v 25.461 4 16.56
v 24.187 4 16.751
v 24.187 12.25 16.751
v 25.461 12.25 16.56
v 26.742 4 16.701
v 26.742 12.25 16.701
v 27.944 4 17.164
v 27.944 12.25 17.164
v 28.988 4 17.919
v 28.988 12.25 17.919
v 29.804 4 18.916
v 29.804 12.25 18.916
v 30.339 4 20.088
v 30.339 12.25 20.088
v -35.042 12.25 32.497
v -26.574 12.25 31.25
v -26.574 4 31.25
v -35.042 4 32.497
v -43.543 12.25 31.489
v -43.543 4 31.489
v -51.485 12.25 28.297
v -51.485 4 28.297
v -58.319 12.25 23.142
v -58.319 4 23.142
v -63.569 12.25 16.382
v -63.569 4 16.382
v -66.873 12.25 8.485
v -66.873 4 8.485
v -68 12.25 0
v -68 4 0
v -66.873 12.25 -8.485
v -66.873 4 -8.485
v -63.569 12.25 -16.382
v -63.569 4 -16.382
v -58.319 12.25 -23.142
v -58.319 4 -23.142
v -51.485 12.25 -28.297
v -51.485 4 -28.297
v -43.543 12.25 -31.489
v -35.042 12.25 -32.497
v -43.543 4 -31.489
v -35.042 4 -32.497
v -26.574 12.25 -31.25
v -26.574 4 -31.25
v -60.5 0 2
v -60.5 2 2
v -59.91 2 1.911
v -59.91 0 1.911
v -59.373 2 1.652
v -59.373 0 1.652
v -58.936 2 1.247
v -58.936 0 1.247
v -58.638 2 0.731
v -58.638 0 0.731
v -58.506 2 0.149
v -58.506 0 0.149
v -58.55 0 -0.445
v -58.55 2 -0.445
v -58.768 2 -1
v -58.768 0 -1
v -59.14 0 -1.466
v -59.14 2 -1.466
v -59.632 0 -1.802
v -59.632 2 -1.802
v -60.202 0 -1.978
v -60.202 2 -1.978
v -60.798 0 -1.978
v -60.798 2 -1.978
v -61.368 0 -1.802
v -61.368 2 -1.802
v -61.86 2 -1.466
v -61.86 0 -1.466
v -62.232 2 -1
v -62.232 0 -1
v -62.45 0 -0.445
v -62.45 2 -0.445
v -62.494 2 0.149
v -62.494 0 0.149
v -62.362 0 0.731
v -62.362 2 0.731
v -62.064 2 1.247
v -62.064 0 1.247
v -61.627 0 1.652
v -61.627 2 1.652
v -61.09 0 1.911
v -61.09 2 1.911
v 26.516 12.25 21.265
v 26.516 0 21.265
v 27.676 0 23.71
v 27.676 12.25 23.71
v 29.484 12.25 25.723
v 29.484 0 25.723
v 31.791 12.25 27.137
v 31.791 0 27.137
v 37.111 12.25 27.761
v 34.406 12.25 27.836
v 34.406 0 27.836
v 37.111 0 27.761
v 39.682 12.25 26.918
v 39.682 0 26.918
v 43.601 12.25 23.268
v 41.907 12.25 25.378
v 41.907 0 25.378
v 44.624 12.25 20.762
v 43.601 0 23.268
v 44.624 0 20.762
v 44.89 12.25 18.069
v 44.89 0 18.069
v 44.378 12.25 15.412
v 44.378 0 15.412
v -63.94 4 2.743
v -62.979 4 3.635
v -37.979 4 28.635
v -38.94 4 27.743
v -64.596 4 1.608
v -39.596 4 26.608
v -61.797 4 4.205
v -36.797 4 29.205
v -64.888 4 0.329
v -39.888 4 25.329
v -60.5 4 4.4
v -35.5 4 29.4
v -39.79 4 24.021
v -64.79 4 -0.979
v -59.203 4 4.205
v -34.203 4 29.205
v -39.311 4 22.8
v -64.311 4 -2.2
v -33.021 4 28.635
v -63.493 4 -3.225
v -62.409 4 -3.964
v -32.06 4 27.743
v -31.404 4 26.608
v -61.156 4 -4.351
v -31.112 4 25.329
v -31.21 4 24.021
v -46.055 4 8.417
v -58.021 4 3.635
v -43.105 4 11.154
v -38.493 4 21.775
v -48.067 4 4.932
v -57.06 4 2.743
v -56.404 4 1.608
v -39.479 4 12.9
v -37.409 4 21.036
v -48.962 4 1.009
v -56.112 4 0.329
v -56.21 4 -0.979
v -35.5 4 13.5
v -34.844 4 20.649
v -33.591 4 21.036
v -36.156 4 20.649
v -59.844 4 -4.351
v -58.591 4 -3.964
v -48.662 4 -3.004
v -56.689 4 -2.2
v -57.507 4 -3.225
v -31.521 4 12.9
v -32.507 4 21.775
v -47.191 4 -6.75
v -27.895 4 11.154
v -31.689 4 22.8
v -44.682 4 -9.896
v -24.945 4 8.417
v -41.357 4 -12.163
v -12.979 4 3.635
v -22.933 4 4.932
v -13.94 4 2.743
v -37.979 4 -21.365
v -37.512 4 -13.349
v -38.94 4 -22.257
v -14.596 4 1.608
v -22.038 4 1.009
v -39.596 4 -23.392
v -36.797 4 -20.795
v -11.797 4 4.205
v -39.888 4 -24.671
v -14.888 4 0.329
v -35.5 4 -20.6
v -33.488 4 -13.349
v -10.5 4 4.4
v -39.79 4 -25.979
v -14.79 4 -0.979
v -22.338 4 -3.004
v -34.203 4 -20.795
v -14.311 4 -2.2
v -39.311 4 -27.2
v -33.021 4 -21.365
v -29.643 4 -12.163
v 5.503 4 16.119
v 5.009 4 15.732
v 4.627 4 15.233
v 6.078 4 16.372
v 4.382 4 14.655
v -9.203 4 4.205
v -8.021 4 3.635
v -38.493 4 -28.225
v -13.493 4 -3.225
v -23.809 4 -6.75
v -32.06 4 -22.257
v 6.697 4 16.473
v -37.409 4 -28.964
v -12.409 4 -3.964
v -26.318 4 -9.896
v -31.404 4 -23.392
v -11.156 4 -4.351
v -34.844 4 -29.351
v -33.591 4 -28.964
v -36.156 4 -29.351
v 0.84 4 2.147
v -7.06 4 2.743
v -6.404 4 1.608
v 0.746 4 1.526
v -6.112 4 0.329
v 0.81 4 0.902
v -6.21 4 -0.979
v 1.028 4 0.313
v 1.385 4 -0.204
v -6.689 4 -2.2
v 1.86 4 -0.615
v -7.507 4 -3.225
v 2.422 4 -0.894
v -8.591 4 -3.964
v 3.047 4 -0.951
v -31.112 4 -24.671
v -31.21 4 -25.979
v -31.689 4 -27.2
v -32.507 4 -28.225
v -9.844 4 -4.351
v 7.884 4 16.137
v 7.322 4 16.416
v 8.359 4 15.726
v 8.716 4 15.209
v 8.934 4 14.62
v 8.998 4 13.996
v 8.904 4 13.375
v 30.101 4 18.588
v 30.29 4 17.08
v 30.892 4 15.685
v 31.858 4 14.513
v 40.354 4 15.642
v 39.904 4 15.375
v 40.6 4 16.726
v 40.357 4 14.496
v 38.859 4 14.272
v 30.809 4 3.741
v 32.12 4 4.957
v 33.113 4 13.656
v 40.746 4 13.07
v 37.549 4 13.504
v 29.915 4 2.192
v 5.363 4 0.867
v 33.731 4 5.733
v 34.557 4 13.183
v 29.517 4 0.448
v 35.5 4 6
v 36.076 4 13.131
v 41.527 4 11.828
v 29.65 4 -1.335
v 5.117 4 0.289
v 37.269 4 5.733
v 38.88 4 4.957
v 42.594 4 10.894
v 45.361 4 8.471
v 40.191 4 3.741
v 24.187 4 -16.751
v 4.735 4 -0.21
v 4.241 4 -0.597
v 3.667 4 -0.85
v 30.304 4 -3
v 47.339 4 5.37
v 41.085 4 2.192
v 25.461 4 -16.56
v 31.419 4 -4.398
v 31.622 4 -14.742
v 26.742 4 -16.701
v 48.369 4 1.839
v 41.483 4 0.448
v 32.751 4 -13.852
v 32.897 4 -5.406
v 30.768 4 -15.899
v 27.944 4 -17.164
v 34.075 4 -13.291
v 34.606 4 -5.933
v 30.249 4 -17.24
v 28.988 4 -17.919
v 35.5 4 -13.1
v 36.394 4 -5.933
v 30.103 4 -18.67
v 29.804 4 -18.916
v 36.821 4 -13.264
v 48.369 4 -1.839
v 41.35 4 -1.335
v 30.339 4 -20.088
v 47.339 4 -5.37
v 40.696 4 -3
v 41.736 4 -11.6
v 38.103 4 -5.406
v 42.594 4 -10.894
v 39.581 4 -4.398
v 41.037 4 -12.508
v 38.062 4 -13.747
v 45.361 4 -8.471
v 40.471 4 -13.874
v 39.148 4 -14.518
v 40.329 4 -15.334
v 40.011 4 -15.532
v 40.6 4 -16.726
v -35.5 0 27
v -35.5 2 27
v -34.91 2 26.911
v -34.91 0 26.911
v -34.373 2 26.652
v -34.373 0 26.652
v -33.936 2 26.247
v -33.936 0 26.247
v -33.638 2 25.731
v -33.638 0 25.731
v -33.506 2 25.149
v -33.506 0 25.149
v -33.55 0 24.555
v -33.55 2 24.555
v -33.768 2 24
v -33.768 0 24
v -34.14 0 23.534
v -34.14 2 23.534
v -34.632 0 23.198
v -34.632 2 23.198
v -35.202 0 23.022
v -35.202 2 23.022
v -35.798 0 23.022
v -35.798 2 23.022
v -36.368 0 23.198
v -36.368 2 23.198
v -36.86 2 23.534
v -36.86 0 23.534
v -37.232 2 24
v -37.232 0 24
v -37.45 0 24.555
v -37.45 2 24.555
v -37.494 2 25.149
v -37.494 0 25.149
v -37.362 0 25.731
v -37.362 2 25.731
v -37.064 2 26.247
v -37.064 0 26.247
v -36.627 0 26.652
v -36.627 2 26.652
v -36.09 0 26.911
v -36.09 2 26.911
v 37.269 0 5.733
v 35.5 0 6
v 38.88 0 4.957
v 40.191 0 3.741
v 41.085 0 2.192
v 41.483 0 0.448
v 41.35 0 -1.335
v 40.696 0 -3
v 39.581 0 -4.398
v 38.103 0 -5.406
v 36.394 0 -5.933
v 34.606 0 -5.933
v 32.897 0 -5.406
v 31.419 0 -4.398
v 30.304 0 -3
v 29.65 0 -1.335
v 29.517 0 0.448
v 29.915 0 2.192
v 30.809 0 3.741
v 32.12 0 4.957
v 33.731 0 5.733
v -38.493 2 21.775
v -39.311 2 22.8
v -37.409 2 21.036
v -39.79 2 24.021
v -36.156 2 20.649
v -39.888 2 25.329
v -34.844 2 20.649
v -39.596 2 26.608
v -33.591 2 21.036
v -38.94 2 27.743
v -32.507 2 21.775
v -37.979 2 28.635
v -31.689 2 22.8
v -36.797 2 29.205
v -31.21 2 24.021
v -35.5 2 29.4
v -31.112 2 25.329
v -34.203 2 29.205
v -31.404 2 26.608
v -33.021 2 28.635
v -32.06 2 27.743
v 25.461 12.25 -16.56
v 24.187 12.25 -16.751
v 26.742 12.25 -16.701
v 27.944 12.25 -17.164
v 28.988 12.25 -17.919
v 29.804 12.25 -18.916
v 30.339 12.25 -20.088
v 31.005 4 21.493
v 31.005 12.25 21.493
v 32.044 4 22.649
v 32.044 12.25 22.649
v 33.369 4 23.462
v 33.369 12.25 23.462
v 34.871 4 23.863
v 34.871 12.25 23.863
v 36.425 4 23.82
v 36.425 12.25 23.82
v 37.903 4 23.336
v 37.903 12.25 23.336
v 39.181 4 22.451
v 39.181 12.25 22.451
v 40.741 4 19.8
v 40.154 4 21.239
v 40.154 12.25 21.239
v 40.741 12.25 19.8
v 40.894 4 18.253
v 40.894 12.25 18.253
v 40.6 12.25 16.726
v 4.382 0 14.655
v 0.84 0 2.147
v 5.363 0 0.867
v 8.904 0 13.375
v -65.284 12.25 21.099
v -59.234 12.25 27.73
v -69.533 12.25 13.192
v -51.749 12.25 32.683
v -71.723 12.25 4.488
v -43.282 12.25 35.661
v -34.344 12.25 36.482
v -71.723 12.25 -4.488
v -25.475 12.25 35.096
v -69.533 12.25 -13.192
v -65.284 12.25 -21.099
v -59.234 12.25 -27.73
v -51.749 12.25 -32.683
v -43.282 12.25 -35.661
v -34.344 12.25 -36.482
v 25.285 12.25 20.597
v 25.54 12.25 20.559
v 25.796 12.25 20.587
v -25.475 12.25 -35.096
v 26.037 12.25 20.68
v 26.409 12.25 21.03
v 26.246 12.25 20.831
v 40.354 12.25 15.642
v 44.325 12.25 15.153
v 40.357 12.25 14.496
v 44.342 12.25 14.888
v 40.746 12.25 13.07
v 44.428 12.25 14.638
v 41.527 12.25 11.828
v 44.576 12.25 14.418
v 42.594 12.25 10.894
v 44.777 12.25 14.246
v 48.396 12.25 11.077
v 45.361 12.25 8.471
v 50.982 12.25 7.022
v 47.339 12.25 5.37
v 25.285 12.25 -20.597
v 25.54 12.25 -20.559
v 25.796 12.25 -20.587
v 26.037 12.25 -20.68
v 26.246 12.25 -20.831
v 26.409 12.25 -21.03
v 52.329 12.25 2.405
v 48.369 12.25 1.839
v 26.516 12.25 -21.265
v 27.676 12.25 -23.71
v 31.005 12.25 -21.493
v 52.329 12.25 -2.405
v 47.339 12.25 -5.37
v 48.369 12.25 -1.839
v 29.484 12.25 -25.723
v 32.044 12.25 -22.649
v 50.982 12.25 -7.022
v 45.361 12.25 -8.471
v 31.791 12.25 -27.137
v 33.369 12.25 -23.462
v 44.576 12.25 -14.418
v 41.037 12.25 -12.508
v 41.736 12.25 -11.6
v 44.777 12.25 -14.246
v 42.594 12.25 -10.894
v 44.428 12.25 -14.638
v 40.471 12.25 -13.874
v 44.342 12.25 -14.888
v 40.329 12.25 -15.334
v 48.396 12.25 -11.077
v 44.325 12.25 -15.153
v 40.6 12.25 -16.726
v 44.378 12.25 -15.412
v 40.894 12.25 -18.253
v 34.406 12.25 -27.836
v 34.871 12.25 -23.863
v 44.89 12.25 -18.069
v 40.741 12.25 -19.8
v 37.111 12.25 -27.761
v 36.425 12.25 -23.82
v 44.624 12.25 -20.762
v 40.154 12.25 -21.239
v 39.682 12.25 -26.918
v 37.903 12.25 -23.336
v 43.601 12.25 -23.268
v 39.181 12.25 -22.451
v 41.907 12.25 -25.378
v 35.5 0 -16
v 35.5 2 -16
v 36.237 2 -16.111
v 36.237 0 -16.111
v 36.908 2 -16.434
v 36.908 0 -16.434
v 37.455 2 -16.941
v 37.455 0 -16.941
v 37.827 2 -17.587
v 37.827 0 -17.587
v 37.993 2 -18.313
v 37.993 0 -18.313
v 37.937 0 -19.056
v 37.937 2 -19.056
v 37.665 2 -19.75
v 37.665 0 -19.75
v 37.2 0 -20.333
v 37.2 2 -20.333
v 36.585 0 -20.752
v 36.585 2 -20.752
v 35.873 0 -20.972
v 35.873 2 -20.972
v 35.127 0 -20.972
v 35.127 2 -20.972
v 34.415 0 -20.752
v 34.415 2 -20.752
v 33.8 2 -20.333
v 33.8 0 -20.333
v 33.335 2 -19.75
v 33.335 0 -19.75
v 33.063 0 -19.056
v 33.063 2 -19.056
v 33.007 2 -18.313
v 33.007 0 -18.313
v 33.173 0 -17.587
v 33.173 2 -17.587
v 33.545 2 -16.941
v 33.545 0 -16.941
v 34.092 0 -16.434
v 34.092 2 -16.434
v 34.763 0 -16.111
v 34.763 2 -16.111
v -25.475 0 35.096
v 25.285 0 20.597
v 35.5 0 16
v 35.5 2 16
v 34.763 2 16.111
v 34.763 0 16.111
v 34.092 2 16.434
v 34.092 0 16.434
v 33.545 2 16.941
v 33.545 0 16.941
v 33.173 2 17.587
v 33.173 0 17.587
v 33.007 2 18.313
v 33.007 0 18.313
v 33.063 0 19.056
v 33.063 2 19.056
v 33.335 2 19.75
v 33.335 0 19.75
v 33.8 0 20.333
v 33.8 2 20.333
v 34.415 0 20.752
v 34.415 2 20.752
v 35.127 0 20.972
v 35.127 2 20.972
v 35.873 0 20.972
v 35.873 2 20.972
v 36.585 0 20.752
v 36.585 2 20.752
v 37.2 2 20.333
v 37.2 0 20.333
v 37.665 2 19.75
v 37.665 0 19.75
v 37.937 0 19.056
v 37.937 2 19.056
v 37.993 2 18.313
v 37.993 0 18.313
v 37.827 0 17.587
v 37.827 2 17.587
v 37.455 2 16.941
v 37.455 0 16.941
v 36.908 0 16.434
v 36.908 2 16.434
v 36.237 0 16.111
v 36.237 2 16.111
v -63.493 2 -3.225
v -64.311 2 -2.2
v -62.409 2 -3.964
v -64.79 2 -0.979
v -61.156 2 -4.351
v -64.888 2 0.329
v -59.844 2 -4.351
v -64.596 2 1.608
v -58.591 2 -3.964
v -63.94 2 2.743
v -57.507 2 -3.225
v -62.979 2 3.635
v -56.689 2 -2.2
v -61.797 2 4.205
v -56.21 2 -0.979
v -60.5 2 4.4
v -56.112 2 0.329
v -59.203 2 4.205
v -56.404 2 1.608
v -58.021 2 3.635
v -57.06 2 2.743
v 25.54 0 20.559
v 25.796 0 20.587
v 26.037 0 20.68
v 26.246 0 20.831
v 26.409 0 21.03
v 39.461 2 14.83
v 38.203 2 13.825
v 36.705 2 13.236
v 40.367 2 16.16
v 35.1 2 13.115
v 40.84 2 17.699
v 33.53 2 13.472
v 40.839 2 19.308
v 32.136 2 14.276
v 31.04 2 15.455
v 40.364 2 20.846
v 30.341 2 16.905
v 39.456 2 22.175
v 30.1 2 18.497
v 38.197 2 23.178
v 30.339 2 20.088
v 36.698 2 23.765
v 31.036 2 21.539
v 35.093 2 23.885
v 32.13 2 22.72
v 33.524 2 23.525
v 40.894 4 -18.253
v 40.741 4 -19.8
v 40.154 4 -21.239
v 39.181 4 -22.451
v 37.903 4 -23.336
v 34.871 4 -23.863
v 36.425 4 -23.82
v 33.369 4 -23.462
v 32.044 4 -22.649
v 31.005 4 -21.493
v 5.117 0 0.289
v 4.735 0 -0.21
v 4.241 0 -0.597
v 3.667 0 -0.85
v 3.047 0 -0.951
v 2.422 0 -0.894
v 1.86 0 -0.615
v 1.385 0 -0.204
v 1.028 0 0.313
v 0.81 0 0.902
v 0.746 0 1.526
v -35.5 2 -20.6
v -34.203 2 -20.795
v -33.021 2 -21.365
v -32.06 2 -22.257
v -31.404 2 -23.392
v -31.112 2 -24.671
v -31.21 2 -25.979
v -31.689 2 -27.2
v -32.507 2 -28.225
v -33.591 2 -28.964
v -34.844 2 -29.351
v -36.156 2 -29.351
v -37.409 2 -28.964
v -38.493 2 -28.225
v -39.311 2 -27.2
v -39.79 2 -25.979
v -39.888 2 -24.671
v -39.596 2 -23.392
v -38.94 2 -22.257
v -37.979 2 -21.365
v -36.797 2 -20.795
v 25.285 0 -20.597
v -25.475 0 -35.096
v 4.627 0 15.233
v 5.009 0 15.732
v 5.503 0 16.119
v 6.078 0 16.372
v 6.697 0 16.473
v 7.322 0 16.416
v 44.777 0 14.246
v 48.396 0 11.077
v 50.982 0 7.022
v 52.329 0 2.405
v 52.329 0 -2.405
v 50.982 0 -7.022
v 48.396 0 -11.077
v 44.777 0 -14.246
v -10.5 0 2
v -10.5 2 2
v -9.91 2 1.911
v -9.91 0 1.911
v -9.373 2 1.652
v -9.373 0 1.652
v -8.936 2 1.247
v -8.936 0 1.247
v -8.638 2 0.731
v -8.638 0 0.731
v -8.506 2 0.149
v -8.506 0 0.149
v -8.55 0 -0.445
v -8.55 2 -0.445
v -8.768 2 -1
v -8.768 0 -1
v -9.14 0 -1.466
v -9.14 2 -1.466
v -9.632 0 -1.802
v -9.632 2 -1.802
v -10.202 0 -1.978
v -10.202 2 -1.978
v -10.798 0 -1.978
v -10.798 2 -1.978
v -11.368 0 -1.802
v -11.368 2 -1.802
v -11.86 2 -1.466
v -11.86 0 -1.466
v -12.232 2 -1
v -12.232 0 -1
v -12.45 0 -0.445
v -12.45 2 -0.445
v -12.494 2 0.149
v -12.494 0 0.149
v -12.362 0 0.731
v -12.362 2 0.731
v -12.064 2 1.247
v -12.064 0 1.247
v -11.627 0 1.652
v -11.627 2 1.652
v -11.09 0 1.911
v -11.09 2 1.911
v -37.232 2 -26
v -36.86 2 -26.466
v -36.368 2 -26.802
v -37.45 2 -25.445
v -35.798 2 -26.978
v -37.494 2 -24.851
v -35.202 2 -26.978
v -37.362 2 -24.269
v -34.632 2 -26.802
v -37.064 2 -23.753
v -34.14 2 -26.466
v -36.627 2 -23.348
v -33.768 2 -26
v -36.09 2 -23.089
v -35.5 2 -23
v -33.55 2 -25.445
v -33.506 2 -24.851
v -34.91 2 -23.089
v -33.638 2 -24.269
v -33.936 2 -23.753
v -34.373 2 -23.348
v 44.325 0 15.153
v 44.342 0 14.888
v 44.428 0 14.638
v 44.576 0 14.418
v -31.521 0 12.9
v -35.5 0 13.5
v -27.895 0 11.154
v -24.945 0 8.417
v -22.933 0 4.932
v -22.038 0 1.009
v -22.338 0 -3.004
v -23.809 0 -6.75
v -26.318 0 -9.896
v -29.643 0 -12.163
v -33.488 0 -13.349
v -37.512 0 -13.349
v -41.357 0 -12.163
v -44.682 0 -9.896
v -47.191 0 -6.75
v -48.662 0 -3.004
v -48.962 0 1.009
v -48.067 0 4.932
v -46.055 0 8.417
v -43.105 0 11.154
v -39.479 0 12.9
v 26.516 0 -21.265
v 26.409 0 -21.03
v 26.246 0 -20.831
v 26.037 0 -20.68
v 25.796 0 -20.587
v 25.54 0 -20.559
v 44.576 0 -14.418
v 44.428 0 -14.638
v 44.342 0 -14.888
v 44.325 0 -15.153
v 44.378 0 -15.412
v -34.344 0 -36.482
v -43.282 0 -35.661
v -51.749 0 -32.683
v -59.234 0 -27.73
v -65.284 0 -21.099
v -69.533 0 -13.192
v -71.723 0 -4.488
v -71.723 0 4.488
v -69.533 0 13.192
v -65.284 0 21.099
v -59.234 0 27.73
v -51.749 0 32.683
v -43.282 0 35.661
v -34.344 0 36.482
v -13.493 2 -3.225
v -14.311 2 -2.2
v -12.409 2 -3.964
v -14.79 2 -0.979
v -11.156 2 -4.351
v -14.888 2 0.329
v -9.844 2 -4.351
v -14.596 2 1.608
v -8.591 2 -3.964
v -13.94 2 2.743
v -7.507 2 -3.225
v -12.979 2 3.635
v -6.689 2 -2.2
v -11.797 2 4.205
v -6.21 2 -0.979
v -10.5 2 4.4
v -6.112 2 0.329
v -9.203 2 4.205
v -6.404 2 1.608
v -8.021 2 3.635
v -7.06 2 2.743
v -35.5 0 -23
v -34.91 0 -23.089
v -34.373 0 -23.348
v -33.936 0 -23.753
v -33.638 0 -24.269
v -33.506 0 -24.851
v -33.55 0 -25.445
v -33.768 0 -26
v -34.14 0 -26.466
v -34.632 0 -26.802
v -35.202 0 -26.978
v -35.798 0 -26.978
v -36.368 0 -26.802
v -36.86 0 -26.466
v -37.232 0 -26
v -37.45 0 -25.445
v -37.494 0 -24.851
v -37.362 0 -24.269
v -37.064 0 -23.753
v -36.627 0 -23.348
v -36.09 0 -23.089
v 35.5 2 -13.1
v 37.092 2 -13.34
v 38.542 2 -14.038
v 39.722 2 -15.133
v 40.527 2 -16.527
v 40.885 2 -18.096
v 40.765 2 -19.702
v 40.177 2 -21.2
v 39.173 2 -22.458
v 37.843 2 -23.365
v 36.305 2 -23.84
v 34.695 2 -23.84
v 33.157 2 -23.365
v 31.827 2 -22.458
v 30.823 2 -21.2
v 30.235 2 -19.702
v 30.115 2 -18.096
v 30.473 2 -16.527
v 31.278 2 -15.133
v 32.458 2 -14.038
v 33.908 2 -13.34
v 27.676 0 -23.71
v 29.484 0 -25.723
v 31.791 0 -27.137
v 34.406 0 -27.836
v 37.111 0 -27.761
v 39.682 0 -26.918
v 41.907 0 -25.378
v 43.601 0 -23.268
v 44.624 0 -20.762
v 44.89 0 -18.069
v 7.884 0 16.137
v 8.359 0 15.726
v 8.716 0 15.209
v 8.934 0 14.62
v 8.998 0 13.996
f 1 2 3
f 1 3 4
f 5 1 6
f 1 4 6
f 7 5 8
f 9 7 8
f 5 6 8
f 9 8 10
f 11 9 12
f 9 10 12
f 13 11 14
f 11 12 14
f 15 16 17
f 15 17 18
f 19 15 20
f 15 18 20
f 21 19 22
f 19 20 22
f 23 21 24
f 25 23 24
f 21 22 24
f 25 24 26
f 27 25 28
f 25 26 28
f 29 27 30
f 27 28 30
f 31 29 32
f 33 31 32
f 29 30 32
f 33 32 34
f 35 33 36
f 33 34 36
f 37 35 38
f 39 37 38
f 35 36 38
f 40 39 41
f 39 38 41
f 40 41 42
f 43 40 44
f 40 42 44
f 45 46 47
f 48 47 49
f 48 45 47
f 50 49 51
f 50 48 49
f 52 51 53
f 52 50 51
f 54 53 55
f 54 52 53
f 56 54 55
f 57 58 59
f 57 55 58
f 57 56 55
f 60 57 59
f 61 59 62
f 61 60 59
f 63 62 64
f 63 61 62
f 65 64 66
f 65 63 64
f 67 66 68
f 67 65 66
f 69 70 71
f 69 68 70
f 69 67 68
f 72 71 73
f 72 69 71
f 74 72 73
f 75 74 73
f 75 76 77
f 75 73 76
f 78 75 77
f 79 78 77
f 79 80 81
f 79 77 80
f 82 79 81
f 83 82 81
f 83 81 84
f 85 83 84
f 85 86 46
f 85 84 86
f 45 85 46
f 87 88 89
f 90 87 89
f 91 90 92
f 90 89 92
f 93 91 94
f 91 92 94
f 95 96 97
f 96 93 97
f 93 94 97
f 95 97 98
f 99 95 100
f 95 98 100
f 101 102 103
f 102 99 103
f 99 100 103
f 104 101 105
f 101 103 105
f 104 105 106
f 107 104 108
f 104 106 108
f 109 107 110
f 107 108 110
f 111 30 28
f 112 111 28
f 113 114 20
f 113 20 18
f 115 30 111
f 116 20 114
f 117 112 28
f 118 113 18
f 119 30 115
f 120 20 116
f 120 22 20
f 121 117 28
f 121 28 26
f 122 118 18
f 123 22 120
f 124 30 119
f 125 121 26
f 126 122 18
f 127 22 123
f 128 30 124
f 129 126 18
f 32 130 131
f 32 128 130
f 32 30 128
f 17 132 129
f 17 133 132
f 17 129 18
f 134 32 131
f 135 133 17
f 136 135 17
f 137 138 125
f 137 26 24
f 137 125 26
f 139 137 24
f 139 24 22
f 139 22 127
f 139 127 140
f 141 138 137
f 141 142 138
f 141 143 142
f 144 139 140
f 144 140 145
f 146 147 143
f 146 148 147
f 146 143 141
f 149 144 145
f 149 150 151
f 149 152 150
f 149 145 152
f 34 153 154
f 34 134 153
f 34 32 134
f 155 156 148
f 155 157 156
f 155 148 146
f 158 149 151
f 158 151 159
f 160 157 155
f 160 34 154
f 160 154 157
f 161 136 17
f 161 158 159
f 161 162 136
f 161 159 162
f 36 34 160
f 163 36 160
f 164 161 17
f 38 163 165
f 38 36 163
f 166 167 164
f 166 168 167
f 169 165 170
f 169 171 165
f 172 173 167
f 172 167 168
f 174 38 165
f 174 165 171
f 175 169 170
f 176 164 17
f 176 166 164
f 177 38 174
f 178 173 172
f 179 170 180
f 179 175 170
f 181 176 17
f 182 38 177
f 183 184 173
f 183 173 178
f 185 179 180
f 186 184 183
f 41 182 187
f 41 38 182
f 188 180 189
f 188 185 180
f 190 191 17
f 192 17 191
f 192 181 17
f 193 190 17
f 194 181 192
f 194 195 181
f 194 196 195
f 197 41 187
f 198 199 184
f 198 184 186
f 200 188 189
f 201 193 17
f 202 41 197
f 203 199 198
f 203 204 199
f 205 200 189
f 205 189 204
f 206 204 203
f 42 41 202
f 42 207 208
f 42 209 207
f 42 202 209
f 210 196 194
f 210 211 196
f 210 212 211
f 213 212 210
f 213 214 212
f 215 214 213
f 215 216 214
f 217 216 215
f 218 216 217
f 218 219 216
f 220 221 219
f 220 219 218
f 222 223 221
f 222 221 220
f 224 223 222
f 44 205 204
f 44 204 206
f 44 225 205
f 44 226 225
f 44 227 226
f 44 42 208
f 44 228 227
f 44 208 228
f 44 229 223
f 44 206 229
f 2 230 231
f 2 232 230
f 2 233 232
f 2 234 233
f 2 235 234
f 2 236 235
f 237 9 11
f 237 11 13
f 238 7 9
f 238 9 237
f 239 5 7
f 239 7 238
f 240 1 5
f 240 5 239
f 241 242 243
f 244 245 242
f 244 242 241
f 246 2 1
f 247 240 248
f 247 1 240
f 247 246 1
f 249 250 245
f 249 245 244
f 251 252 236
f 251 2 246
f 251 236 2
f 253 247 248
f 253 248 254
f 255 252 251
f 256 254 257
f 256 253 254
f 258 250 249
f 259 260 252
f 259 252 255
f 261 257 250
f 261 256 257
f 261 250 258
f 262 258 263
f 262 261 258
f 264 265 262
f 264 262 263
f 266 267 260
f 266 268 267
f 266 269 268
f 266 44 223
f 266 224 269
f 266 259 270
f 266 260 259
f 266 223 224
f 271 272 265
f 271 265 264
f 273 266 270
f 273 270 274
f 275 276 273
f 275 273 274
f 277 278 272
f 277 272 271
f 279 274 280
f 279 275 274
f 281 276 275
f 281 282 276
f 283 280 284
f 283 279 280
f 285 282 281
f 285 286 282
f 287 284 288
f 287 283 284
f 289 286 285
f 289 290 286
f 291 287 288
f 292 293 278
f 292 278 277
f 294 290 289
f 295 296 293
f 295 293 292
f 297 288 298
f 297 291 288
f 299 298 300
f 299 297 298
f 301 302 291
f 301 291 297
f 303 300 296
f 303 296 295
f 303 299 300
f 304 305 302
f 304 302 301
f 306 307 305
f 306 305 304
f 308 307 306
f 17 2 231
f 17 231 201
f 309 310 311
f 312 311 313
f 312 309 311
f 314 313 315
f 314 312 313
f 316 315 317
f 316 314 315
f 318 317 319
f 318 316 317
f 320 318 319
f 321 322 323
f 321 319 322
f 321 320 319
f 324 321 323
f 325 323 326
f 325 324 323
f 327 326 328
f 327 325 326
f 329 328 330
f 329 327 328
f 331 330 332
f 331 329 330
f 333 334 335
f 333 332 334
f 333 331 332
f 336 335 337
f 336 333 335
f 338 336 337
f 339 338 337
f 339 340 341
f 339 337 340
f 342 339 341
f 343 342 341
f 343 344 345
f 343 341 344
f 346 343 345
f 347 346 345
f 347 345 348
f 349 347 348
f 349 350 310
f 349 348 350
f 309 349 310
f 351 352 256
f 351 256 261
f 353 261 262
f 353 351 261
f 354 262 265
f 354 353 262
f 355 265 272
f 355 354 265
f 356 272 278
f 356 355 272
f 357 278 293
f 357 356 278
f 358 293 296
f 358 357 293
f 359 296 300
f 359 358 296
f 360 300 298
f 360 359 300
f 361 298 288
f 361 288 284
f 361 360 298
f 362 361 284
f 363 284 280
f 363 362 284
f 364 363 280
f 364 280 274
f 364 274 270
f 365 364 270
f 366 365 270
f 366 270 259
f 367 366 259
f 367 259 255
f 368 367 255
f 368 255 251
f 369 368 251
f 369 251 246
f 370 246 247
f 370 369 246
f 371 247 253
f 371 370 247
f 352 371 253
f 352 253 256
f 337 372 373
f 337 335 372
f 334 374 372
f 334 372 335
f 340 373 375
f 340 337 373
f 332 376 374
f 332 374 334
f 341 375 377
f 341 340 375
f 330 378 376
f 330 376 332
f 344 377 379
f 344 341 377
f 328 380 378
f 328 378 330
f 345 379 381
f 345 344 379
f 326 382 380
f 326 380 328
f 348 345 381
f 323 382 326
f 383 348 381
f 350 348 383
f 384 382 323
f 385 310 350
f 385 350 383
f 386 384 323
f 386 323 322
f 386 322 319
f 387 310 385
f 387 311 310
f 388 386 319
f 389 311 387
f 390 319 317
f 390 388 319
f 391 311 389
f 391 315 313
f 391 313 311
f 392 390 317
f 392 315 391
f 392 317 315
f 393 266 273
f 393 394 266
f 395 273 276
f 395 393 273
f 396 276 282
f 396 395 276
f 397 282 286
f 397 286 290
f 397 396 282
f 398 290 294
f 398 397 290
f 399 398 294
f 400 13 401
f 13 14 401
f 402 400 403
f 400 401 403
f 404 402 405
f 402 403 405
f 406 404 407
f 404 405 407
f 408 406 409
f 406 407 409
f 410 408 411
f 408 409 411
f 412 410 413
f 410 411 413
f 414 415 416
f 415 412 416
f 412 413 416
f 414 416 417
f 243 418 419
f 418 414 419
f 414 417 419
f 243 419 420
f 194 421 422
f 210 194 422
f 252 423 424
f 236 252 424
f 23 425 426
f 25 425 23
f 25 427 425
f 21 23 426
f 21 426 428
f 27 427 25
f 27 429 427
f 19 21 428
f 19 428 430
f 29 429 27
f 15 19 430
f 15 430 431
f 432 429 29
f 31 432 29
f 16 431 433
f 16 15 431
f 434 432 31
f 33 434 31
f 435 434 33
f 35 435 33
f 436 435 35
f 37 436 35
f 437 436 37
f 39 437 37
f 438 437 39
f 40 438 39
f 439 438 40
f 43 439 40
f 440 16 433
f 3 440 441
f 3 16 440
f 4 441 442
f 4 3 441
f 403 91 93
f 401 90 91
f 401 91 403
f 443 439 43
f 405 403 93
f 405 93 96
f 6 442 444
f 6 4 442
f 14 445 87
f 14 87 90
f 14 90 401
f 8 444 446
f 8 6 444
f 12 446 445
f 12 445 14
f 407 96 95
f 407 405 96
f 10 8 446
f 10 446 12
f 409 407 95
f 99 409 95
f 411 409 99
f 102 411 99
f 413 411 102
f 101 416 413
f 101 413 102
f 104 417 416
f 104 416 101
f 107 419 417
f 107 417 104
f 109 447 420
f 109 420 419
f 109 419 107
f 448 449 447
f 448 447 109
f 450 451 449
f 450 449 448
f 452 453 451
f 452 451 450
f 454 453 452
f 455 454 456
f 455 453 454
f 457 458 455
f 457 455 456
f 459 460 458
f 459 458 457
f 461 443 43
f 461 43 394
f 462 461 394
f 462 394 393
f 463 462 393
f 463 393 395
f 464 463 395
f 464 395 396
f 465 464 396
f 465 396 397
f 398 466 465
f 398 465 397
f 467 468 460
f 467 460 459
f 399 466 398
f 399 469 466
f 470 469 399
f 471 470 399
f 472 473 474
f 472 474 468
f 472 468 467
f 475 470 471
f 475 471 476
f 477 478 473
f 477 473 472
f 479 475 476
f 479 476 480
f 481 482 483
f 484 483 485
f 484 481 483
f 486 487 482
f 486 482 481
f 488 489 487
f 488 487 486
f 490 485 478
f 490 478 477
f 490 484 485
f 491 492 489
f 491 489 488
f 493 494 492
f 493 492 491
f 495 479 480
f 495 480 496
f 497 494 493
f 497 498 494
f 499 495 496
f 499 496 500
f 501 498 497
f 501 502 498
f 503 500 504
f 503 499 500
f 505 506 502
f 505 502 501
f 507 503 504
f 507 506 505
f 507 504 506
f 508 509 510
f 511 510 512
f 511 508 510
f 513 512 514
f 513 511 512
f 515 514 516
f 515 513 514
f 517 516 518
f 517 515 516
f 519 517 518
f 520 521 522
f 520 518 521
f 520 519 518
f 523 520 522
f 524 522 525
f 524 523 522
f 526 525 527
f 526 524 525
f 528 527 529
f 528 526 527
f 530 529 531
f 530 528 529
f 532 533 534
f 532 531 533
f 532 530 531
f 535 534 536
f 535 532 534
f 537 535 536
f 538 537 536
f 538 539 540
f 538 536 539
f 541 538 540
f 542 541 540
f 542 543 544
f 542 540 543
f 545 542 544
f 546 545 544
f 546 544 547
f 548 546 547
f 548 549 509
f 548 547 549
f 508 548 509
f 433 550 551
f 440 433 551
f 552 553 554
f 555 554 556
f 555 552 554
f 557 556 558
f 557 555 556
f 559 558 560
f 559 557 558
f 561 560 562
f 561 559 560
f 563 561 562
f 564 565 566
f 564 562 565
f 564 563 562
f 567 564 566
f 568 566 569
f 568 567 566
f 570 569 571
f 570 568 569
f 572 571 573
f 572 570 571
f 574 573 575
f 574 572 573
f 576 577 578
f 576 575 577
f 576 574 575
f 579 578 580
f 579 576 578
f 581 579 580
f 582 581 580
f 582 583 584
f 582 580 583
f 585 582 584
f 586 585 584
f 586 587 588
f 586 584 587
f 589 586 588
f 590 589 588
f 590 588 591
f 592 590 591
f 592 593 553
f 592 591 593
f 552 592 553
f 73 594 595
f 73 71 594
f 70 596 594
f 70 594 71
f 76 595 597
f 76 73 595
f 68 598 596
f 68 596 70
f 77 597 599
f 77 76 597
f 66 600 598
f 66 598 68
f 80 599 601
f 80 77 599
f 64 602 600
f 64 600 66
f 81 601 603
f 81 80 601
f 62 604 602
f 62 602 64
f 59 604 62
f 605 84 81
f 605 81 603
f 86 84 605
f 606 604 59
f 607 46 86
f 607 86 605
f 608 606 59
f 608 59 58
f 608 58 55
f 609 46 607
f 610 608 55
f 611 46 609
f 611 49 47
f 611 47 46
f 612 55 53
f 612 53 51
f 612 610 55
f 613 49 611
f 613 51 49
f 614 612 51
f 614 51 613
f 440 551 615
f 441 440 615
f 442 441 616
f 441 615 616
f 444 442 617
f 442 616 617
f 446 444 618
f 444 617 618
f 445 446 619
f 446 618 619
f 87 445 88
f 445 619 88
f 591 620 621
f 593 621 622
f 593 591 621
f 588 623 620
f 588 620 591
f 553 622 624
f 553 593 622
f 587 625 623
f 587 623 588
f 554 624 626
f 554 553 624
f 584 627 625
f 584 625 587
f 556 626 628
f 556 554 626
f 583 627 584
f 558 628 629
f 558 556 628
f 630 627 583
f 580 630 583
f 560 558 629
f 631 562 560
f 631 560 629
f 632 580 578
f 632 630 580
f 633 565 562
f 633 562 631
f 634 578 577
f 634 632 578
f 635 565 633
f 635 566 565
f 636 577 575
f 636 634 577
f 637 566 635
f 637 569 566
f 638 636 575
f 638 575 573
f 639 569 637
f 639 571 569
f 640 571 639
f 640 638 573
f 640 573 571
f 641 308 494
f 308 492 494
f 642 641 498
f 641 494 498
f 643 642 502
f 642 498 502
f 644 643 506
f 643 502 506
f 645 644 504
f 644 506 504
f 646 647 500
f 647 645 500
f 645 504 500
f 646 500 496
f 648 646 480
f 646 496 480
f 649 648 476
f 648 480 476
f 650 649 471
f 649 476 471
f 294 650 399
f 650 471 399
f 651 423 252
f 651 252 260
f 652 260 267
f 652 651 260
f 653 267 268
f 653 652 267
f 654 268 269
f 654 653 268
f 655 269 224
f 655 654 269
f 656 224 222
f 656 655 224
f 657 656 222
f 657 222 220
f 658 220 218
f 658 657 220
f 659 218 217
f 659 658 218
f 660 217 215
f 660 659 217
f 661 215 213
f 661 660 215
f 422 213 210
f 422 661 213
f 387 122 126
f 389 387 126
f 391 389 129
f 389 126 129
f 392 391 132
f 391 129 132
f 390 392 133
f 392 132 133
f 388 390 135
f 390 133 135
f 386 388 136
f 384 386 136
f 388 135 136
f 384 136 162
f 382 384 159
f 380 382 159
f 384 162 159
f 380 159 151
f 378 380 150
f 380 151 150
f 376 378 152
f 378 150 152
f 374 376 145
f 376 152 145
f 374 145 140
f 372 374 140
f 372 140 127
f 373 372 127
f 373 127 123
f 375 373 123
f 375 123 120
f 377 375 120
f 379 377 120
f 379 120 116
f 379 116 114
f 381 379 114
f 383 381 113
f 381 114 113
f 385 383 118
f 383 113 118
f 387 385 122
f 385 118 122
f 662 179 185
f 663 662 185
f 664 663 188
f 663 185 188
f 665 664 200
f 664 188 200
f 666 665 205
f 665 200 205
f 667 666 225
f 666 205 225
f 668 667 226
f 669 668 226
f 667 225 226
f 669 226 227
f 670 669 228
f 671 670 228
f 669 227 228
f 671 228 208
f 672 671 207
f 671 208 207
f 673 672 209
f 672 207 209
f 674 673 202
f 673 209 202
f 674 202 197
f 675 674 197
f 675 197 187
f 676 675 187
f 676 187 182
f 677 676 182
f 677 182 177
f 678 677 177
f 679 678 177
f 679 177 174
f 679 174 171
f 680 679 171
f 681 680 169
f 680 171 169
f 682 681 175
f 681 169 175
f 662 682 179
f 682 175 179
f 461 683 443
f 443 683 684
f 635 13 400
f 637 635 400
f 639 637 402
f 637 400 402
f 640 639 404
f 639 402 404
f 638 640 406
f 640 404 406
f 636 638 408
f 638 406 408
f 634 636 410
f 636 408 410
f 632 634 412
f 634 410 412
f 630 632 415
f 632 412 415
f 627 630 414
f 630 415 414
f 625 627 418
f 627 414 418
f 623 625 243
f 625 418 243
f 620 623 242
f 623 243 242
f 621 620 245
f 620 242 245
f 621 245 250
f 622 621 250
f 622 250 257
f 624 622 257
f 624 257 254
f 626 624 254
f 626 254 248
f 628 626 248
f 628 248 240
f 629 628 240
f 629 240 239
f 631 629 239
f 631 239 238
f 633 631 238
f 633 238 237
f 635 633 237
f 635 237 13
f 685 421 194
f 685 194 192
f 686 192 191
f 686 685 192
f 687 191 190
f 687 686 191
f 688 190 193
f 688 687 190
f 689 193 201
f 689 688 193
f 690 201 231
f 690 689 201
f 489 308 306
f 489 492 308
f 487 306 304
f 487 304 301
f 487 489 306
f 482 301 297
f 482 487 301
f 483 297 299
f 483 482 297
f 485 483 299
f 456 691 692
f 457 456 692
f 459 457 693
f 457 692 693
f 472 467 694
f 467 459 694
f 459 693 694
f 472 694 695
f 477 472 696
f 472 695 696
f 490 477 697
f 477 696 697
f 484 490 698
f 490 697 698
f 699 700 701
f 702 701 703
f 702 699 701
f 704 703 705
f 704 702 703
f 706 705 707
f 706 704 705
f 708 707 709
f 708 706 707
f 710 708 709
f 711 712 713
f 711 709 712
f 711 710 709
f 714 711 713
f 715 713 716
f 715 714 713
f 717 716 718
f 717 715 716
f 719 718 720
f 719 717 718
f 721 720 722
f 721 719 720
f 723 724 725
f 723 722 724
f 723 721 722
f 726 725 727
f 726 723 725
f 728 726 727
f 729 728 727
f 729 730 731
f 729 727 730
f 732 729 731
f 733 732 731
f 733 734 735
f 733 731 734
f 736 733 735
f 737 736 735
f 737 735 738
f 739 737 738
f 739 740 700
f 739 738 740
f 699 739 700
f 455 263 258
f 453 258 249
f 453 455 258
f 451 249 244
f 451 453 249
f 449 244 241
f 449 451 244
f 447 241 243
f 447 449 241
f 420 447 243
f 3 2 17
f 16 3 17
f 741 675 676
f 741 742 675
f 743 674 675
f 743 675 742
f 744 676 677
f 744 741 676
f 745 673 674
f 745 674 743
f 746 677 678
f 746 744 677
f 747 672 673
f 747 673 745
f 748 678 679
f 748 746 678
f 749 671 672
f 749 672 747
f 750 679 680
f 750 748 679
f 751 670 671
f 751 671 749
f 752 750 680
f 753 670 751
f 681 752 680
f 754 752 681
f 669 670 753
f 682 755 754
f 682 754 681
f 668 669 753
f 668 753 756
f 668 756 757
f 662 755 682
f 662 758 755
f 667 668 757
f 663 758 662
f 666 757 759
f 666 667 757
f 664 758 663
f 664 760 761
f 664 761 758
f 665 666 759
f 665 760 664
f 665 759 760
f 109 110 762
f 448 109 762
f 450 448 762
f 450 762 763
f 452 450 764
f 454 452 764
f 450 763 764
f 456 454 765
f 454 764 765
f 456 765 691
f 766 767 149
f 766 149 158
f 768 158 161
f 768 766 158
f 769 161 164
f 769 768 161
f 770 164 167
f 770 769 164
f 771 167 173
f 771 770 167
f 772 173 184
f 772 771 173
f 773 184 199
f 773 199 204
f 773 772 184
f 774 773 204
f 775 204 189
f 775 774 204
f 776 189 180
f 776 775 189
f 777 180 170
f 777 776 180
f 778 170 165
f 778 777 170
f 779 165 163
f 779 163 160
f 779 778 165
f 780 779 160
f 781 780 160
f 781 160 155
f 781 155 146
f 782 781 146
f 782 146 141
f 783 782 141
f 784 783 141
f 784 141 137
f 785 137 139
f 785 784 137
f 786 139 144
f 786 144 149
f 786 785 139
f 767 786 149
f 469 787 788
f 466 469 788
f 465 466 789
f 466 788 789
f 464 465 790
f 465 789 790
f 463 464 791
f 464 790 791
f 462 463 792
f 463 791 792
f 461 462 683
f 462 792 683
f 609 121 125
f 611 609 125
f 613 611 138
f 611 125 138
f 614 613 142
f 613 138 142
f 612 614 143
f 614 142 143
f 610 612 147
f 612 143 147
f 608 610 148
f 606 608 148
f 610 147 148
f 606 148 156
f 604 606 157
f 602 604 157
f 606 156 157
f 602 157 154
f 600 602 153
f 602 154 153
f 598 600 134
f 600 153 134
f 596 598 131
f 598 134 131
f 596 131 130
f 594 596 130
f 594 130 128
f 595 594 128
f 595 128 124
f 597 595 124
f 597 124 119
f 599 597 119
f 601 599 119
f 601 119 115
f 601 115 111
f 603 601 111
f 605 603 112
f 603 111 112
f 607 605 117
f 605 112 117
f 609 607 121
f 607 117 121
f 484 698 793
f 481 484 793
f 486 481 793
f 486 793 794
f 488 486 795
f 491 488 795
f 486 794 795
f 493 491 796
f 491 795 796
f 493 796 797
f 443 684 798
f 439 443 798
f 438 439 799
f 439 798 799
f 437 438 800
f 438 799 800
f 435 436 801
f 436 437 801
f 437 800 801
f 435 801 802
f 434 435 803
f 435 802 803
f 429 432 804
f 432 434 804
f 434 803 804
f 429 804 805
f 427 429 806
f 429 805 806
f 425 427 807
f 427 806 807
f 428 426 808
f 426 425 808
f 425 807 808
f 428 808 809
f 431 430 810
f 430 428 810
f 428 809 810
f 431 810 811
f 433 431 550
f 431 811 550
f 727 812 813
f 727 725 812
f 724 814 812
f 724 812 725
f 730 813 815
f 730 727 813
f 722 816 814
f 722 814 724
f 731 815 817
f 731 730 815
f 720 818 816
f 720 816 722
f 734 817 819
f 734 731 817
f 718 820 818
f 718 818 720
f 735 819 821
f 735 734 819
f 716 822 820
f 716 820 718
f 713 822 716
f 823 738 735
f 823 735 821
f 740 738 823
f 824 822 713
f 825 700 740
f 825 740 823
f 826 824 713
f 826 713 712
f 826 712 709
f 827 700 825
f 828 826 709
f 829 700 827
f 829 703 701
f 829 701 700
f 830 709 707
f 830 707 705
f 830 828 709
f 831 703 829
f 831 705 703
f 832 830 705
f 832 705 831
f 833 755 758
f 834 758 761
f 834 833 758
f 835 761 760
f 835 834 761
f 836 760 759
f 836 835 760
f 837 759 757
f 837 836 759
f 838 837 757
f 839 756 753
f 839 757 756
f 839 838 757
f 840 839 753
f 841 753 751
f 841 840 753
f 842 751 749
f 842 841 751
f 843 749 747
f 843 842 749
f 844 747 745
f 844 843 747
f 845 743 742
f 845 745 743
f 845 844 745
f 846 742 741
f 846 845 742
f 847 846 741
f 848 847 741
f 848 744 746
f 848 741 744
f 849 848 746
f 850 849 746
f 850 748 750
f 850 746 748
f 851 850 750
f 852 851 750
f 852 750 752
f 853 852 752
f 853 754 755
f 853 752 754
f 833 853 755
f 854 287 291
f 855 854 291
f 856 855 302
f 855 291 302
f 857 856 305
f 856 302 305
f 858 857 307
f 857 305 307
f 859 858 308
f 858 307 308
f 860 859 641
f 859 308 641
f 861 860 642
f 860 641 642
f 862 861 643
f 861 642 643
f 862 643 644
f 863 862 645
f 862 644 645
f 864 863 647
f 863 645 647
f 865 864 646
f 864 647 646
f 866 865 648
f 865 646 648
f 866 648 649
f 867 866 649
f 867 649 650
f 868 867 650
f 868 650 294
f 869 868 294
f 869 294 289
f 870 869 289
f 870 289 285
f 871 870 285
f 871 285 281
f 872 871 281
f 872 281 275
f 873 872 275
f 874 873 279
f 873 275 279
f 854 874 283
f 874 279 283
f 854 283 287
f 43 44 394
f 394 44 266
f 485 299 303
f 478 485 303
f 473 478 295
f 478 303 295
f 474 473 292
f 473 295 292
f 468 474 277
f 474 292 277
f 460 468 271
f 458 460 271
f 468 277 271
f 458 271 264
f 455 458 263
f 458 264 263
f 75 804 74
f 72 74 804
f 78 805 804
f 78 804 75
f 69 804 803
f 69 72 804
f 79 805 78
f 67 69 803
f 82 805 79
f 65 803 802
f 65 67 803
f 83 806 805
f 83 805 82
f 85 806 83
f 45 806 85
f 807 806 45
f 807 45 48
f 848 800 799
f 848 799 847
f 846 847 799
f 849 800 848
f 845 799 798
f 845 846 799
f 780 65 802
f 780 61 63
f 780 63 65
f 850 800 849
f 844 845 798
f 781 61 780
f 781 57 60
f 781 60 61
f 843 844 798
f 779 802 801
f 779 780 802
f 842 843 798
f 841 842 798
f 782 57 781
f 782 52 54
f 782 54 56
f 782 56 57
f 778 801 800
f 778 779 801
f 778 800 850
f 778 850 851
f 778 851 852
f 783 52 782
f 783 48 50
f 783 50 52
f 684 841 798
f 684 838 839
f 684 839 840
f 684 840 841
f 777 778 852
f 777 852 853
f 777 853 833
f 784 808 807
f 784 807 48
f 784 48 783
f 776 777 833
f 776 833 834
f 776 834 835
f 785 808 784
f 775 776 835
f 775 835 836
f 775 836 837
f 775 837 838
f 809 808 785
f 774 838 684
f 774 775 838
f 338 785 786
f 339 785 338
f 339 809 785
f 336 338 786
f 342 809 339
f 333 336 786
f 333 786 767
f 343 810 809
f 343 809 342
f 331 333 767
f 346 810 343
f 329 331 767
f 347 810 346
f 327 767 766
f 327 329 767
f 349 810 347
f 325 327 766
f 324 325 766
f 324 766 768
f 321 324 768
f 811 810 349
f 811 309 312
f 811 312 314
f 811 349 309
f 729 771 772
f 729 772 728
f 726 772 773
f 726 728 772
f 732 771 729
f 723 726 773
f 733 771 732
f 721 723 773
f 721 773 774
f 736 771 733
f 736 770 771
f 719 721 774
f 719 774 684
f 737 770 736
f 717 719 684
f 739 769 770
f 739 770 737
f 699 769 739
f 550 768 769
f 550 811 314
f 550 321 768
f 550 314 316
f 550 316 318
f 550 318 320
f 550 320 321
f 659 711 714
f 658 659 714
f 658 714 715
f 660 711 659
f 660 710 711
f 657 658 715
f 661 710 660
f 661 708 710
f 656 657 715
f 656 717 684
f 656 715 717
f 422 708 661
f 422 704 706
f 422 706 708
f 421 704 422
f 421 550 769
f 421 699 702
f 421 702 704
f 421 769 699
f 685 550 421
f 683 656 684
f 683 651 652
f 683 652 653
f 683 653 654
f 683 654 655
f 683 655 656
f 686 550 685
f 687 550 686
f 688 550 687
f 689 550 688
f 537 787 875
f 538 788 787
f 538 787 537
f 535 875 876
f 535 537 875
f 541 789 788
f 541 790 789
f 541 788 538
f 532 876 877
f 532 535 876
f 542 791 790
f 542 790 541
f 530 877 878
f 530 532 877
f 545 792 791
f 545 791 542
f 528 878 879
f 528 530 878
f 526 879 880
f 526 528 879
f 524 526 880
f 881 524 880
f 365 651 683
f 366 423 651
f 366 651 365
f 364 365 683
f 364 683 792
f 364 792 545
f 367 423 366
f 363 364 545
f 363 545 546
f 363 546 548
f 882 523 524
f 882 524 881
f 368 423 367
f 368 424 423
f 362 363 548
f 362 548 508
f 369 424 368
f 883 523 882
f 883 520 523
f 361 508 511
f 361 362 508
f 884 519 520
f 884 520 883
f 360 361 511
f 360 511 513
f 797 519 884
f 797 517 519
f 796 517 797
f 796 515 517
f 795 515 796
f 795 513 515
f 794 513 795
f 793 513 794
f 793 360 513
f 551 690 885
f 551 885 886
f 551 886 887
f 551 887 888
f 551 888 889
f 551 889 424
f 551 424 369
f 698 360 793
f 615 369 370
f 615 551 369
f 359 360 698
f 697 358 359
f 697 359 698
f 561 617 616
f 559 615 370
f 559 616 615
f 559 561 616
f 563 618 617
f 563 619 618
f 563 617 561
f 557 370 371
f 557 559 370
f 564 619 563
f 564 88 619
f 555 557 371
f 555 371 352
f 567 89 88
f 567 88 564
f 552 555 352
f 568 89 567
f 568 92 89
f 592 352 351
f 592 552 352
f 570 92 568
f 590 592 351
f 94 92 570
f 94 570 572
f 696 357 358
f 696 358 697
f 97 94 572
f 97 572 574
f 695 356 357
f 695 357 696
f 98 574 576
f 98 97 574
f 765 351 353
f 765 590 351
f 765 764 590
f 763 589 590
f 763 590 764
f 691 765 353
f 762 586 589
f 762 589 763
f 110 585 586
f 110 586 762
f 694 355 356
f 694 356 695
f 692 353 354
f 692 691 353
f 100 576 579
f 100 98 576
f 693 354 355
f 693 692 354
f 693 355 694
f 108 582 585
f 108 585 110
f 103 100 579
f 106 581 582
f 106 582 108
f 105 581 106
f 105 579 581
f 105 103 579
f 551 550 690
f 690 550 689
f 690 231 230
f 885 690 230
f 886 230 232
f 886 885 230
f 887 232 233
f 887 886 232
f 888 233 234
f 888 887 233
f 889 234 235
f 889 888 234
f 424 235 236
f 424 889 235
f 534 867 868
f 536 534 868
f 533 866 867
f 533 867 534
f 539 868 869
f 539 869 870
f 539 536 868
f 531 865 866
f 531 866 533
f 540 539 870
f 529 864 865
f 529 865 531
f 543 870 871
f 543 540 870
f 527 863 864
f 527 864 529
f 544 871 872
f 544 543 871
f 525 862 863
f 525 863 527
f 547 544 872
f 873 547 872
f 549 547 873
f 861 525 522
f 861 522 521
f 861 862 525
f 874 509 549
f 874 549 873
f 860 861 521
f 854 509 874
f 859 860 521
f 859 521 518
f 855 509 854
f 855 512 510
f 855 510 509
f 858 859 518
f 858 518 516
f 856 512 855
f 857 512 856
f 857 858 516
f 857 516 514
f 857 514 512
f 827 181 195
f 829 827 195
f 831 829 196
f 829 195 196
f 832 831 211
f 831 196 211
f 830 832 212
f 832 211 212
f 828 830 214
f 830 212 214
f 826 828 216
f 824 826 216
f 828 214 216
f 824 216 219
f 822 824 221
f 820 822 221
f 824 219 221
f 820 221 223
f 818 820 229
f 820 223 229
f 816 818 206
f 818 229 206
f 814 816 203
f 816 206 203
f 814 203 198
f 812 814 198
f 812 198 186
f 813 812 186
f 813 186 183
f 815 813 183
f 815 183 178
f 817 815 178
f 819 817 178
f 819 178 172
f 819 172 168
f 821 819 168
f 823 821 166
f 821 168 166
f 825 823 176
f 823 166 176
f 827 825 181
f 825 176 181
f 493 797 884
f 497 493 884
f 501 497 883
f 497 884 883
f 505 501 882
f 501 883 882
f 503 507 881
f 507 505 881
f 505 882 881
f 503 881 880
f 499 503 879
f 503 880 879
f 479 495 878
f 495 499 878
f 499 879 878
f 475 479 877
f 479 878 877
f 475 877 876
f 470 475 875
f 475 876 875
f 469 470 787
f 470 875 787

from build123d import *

# Parameters (mm, degrees)
SKETCH1_W               = 175
SKETCH1_H               = 100
SKETCH1_R               = 6
SKETCH1_R_2             = 13.5
SKETCH1_R_3             = 2
SKETCH1_R_4             = 2.5
BOSS_EXTRUDE1_DEPTH     = 4
SKETCH3_W               = 175
SKETCH3_H               = 100
BOSS_EXTRUDE2_DEPTH     = 8.25
SKETCH6_R               = 5.4
CUT_EXTRUDE2_DEPTH      = 8.25
FILLET1_R               = 2.5
FILLET2_R               = 5
SKETCH2_R               = 4.4
SKETCH2_R_2             = 5.4
CUT_EXTRUDE1_DEPTH      = 2
CUT_EXTRUDE4_DEPTH      = 102.520010478
CUT_EXTRUDE4_DEPTH_BACK = 102.520010478
SKETCH7_OUTSIDE_W       = 217.386
SKETCH7_OUTSIDE_H       = 142.386


with BuildPart() as part:
    # Sketch1 → Boss-Extrude1 (new body)
    with BuildSketch(Plane(origin=(0, 0, 0), x_dir=(1, 0, 0), z_dir=(0, 1, 0))):
        Rectangle(SKETCH1_W, SKETCH1_H)
        with Locations(Location((35.5, 0, 0), (0, 0, 270))):
            Circle(SKETCH1_R, mode=Mode.SUBTRACT)
        with Locations(Location((-35.5, 0, 0), (0, 0, 270))):
            Circle(SKETCH1_R_2, mode=Mode.SUBTRACT)
        with Locations(Location((-60.5, 0, 0), (0, 0, 270))):
            Circle(SKETCH1_R_3, mode=Mode.SUBTRACT)
        with Locations(Location((-35.5, 25, 0), (0, 0, 270))):
            Circle(SKETCH1_R_3, mode=Mode.SUBTRACT)
        with Locations(Location((-10.5, 0, 0), (0, 0, 270))):
            Circle(SKETCH1_R_3, mode=Mode.SUBTRACT)
        with Locations(Location((-35.5, -25, 0), (0, 0, 270))):
            Circle(SKETCH1_R_3, mode=Mode.SUBTRACT)
        with Locations(Location((35.5, 18.5, 0), (0, 0, 270))):
            Circle(SKETCH1_R_4, mode=Mode.SUBTRACT)
        with Locations(Location((35.5, -18.5, 0), (0, 0, 90))):
            Circle(SKETCH1_R_4, mode=Mode.SUBTRACT)
        Polygon((4.517711304, -15.136418767), (0.159242352, 0.258507293), (4.681501882, 1.538807548), (9.039970835, -13.856118512), (9.584779454, -15.78048427), (5.062519924, -17.060784524), align=None, mode=Mode.SUBTRACT)
    extrude(amount=BOSS_EXTRUDE1_DEPTH)

    # Sketch3 → Boss-Extrude2 (add)
    with BuildSketch(Plane(origin=(0, 4, 0), x_dir=(1, 0, 0), z_dir=(0, 1, 0))):
        Rectangle(SKETCH3_W, SKETCH3_H)
        with BuildLine():
            Line((-26.573943662, 31.250208291), (39.070422535, 12.500083317))
            ThreePointArc((39.070422535, 12.500083317), (48.5, 0), (39.070422535, -12.500083317))
            Line((39.070422535, -12.500083317), (-26.573943662, -31.250208291))
            ThreePointArc((-26.573943662, -31.250208291), (-68, 0), (-26.573943662, 31.250208291))
        make_face(mode=Mode.SUBTRACT)
    extrude(amount=BOSS_EXTRUDE2_DEPTH)

    # Sketch6 → Cut-Extrude2 (cut)
    with BuildSketch(Plane(origin=(0, 12.25, 0), x_dir=(1, 0, 0), z_dir=(0, 1, 0))):
        with Locations((35.5, 18.5)):
            Circle(SKETCH6_R)
        with Locations((35.5, -18.5)):
            Circle(SKETCH6_R)
    extrude(amount=-CUT_EXTRUDE2_DEPTH, mode=Mode.SUBTRACT)

    # Fillet1
    # the kernel refuses this fillet: 2.5 mm, written as the material it adds along each edge
    with BuildSketch(Plane(origin=(9.584779454, 0, 15.78048427), x_dir=(-0.9621828787440704, 0, 0.2724043095323078), z_dir=(0, 1, 0)), Plane(origin=(5.062519924, 0, 17.060784524), x_dir=(-0.2724043095323173, 0, -0.9621828787440677), z_dir=(0, 1, 0)), Plane(origin=(4.681501882, 0, -1.538807548), x_dir=(0.2724043095323092, 0, 0.96218287874407), z_dir=(0, 1, 0))) as fillet1_piece_1:
        with BuildLine():
            CenterArc((FILLET1_R, -FILLET1_R), FILLET1_R, 90, 90)
            Line((0, -FILLET1_R), (0, 0))
            Line((0, 0), (FILLET1_R, 0))
        make_face()
    extrude(amount=4)
    with BuildSketch(Plane(origin=(0.159242352, 0, -0.258507293), x_dir=(0.2724043095323079, 0, 0.9621828787440704), z_dir=(0, 1, 0))) as fillet1_piece_2:
        with BuildLine():
            CenterArc((FILLET1_R, FILLET1_R), FILLET1_R, 180, 90)
            Line((0, FILLET1_R), (0, 0))
            Line((0, 0), (FILLET1_R, 0))
        make_face()
    extrude(amount=4)

    # Fillet2
    fillet2_edges = [part.edges().sort_by_distance(p)[0] for p in [
        (31.784909874, 8.125, 14.581058133),
        (36.584743308, 8.125, 13.210072594),
        (36.584743308, 8.125, -13.210072594),
        (31.784909874, 8.125, -14.581058133),
    ]]
    fillet(fillet2_edges, radius=FILLET2_R)

    # Sketch2 → Cut-Extrude1 (cut)
    with BuildSketch(Plane(origin=(0, 4, 0), x_dir=(1, 0, 0), z_dir=(0, 1, 0))):
        with Locations(Location((-35.5, 25, 0), (0, 0, 270))):
            Circle(SKETCH2_R)
        with Locations(Location((-10.5, 0, 0), (0, 0, 270))):
            Circle(SKETCH2_R)
        with Locations(Location((-35.5, -25, 0), (0, 0, 270))):
            Circle(SKETCH2_R)
        with Locations(Location((-60.5, 0, 0), (0, 0, 270))):
            Circle(SKETCH2_R)
        with Locations(Location((35.5, 18.5, 0), (0, 0, 270))):
            Circle(SKETCH2_R_2)
        with Locations(Location((35.5, -18.5, 0), (0, 0, 197.105868404))):
            Circle(SKETCH2_R_2)
    extrude(amount=-CUT_EXTRUDE1_DEPTH, mode=Mode.SUBTRACT)

    # Sketch7 outside → Cut-Extrude4 (cut, two sides: drawn at the far end of the back side and taken through both)
    with BuildSketch(Plane(origin=(0, 12.25, 0), x_dir=(1, 0, 0), z_dir=(0, 1, 0)).offset(-CUT_EXTRUDE4_DEPTH_BACK)):
        Rectangle(SKETCH7_OUTSIDE_W, SKETCH7_OUTSIDE_H)
        with BuildLine():
            Line((-25.475352113, -35.096387773), (25.285418022, -20.597492606))
            ThreePointArc((25.285418022, -20.597492606), (26.036864948, -20.680025145), (26.515828803, -21.264899257))
            ThreePointArc((26.515828803, -21.264899257), (38.426917352, -27.432701429), (44.378310133, -15.41202183))
            ThreePointArc((44.378310133, -15.41202183), (44.376580158, -14.760021946), (44.777099477, -14.245540541))
            ThreePointArc((44.777099477, -14.245540541), (52.5, 0), (44.777099477, 14.245540541))
            ThreePointArc((44.777099477, 14.245540541), (44.376580158, 14.760021946), (44.378310133, 15.41202183))
            ThreePointArc((44.378310133, 15.41202183), (38.426917352, 27.432701429), (26.515828803, 21.264899257))
            ThreePointArc((26.515828803, 21.264899257), (26.036864948, 20.680025145), (25.285418022, 20.597492606))
            Line((25.285418022, 20.597492606), (-25.475352113, 35.096387773))
            ThreePointArc((-25.475352113, 35.096387773), (-72, 0), (-25.475352113, -35.096387773))
        make_face(mode=Mode.SUBTRACT)
    extrude(amount=CUT_EXTRUDE4_DEPTH + CUT_EXTRUDE4_DEPTH_BACK, mode=Mode.SUBTRACT)


solid = part.part
